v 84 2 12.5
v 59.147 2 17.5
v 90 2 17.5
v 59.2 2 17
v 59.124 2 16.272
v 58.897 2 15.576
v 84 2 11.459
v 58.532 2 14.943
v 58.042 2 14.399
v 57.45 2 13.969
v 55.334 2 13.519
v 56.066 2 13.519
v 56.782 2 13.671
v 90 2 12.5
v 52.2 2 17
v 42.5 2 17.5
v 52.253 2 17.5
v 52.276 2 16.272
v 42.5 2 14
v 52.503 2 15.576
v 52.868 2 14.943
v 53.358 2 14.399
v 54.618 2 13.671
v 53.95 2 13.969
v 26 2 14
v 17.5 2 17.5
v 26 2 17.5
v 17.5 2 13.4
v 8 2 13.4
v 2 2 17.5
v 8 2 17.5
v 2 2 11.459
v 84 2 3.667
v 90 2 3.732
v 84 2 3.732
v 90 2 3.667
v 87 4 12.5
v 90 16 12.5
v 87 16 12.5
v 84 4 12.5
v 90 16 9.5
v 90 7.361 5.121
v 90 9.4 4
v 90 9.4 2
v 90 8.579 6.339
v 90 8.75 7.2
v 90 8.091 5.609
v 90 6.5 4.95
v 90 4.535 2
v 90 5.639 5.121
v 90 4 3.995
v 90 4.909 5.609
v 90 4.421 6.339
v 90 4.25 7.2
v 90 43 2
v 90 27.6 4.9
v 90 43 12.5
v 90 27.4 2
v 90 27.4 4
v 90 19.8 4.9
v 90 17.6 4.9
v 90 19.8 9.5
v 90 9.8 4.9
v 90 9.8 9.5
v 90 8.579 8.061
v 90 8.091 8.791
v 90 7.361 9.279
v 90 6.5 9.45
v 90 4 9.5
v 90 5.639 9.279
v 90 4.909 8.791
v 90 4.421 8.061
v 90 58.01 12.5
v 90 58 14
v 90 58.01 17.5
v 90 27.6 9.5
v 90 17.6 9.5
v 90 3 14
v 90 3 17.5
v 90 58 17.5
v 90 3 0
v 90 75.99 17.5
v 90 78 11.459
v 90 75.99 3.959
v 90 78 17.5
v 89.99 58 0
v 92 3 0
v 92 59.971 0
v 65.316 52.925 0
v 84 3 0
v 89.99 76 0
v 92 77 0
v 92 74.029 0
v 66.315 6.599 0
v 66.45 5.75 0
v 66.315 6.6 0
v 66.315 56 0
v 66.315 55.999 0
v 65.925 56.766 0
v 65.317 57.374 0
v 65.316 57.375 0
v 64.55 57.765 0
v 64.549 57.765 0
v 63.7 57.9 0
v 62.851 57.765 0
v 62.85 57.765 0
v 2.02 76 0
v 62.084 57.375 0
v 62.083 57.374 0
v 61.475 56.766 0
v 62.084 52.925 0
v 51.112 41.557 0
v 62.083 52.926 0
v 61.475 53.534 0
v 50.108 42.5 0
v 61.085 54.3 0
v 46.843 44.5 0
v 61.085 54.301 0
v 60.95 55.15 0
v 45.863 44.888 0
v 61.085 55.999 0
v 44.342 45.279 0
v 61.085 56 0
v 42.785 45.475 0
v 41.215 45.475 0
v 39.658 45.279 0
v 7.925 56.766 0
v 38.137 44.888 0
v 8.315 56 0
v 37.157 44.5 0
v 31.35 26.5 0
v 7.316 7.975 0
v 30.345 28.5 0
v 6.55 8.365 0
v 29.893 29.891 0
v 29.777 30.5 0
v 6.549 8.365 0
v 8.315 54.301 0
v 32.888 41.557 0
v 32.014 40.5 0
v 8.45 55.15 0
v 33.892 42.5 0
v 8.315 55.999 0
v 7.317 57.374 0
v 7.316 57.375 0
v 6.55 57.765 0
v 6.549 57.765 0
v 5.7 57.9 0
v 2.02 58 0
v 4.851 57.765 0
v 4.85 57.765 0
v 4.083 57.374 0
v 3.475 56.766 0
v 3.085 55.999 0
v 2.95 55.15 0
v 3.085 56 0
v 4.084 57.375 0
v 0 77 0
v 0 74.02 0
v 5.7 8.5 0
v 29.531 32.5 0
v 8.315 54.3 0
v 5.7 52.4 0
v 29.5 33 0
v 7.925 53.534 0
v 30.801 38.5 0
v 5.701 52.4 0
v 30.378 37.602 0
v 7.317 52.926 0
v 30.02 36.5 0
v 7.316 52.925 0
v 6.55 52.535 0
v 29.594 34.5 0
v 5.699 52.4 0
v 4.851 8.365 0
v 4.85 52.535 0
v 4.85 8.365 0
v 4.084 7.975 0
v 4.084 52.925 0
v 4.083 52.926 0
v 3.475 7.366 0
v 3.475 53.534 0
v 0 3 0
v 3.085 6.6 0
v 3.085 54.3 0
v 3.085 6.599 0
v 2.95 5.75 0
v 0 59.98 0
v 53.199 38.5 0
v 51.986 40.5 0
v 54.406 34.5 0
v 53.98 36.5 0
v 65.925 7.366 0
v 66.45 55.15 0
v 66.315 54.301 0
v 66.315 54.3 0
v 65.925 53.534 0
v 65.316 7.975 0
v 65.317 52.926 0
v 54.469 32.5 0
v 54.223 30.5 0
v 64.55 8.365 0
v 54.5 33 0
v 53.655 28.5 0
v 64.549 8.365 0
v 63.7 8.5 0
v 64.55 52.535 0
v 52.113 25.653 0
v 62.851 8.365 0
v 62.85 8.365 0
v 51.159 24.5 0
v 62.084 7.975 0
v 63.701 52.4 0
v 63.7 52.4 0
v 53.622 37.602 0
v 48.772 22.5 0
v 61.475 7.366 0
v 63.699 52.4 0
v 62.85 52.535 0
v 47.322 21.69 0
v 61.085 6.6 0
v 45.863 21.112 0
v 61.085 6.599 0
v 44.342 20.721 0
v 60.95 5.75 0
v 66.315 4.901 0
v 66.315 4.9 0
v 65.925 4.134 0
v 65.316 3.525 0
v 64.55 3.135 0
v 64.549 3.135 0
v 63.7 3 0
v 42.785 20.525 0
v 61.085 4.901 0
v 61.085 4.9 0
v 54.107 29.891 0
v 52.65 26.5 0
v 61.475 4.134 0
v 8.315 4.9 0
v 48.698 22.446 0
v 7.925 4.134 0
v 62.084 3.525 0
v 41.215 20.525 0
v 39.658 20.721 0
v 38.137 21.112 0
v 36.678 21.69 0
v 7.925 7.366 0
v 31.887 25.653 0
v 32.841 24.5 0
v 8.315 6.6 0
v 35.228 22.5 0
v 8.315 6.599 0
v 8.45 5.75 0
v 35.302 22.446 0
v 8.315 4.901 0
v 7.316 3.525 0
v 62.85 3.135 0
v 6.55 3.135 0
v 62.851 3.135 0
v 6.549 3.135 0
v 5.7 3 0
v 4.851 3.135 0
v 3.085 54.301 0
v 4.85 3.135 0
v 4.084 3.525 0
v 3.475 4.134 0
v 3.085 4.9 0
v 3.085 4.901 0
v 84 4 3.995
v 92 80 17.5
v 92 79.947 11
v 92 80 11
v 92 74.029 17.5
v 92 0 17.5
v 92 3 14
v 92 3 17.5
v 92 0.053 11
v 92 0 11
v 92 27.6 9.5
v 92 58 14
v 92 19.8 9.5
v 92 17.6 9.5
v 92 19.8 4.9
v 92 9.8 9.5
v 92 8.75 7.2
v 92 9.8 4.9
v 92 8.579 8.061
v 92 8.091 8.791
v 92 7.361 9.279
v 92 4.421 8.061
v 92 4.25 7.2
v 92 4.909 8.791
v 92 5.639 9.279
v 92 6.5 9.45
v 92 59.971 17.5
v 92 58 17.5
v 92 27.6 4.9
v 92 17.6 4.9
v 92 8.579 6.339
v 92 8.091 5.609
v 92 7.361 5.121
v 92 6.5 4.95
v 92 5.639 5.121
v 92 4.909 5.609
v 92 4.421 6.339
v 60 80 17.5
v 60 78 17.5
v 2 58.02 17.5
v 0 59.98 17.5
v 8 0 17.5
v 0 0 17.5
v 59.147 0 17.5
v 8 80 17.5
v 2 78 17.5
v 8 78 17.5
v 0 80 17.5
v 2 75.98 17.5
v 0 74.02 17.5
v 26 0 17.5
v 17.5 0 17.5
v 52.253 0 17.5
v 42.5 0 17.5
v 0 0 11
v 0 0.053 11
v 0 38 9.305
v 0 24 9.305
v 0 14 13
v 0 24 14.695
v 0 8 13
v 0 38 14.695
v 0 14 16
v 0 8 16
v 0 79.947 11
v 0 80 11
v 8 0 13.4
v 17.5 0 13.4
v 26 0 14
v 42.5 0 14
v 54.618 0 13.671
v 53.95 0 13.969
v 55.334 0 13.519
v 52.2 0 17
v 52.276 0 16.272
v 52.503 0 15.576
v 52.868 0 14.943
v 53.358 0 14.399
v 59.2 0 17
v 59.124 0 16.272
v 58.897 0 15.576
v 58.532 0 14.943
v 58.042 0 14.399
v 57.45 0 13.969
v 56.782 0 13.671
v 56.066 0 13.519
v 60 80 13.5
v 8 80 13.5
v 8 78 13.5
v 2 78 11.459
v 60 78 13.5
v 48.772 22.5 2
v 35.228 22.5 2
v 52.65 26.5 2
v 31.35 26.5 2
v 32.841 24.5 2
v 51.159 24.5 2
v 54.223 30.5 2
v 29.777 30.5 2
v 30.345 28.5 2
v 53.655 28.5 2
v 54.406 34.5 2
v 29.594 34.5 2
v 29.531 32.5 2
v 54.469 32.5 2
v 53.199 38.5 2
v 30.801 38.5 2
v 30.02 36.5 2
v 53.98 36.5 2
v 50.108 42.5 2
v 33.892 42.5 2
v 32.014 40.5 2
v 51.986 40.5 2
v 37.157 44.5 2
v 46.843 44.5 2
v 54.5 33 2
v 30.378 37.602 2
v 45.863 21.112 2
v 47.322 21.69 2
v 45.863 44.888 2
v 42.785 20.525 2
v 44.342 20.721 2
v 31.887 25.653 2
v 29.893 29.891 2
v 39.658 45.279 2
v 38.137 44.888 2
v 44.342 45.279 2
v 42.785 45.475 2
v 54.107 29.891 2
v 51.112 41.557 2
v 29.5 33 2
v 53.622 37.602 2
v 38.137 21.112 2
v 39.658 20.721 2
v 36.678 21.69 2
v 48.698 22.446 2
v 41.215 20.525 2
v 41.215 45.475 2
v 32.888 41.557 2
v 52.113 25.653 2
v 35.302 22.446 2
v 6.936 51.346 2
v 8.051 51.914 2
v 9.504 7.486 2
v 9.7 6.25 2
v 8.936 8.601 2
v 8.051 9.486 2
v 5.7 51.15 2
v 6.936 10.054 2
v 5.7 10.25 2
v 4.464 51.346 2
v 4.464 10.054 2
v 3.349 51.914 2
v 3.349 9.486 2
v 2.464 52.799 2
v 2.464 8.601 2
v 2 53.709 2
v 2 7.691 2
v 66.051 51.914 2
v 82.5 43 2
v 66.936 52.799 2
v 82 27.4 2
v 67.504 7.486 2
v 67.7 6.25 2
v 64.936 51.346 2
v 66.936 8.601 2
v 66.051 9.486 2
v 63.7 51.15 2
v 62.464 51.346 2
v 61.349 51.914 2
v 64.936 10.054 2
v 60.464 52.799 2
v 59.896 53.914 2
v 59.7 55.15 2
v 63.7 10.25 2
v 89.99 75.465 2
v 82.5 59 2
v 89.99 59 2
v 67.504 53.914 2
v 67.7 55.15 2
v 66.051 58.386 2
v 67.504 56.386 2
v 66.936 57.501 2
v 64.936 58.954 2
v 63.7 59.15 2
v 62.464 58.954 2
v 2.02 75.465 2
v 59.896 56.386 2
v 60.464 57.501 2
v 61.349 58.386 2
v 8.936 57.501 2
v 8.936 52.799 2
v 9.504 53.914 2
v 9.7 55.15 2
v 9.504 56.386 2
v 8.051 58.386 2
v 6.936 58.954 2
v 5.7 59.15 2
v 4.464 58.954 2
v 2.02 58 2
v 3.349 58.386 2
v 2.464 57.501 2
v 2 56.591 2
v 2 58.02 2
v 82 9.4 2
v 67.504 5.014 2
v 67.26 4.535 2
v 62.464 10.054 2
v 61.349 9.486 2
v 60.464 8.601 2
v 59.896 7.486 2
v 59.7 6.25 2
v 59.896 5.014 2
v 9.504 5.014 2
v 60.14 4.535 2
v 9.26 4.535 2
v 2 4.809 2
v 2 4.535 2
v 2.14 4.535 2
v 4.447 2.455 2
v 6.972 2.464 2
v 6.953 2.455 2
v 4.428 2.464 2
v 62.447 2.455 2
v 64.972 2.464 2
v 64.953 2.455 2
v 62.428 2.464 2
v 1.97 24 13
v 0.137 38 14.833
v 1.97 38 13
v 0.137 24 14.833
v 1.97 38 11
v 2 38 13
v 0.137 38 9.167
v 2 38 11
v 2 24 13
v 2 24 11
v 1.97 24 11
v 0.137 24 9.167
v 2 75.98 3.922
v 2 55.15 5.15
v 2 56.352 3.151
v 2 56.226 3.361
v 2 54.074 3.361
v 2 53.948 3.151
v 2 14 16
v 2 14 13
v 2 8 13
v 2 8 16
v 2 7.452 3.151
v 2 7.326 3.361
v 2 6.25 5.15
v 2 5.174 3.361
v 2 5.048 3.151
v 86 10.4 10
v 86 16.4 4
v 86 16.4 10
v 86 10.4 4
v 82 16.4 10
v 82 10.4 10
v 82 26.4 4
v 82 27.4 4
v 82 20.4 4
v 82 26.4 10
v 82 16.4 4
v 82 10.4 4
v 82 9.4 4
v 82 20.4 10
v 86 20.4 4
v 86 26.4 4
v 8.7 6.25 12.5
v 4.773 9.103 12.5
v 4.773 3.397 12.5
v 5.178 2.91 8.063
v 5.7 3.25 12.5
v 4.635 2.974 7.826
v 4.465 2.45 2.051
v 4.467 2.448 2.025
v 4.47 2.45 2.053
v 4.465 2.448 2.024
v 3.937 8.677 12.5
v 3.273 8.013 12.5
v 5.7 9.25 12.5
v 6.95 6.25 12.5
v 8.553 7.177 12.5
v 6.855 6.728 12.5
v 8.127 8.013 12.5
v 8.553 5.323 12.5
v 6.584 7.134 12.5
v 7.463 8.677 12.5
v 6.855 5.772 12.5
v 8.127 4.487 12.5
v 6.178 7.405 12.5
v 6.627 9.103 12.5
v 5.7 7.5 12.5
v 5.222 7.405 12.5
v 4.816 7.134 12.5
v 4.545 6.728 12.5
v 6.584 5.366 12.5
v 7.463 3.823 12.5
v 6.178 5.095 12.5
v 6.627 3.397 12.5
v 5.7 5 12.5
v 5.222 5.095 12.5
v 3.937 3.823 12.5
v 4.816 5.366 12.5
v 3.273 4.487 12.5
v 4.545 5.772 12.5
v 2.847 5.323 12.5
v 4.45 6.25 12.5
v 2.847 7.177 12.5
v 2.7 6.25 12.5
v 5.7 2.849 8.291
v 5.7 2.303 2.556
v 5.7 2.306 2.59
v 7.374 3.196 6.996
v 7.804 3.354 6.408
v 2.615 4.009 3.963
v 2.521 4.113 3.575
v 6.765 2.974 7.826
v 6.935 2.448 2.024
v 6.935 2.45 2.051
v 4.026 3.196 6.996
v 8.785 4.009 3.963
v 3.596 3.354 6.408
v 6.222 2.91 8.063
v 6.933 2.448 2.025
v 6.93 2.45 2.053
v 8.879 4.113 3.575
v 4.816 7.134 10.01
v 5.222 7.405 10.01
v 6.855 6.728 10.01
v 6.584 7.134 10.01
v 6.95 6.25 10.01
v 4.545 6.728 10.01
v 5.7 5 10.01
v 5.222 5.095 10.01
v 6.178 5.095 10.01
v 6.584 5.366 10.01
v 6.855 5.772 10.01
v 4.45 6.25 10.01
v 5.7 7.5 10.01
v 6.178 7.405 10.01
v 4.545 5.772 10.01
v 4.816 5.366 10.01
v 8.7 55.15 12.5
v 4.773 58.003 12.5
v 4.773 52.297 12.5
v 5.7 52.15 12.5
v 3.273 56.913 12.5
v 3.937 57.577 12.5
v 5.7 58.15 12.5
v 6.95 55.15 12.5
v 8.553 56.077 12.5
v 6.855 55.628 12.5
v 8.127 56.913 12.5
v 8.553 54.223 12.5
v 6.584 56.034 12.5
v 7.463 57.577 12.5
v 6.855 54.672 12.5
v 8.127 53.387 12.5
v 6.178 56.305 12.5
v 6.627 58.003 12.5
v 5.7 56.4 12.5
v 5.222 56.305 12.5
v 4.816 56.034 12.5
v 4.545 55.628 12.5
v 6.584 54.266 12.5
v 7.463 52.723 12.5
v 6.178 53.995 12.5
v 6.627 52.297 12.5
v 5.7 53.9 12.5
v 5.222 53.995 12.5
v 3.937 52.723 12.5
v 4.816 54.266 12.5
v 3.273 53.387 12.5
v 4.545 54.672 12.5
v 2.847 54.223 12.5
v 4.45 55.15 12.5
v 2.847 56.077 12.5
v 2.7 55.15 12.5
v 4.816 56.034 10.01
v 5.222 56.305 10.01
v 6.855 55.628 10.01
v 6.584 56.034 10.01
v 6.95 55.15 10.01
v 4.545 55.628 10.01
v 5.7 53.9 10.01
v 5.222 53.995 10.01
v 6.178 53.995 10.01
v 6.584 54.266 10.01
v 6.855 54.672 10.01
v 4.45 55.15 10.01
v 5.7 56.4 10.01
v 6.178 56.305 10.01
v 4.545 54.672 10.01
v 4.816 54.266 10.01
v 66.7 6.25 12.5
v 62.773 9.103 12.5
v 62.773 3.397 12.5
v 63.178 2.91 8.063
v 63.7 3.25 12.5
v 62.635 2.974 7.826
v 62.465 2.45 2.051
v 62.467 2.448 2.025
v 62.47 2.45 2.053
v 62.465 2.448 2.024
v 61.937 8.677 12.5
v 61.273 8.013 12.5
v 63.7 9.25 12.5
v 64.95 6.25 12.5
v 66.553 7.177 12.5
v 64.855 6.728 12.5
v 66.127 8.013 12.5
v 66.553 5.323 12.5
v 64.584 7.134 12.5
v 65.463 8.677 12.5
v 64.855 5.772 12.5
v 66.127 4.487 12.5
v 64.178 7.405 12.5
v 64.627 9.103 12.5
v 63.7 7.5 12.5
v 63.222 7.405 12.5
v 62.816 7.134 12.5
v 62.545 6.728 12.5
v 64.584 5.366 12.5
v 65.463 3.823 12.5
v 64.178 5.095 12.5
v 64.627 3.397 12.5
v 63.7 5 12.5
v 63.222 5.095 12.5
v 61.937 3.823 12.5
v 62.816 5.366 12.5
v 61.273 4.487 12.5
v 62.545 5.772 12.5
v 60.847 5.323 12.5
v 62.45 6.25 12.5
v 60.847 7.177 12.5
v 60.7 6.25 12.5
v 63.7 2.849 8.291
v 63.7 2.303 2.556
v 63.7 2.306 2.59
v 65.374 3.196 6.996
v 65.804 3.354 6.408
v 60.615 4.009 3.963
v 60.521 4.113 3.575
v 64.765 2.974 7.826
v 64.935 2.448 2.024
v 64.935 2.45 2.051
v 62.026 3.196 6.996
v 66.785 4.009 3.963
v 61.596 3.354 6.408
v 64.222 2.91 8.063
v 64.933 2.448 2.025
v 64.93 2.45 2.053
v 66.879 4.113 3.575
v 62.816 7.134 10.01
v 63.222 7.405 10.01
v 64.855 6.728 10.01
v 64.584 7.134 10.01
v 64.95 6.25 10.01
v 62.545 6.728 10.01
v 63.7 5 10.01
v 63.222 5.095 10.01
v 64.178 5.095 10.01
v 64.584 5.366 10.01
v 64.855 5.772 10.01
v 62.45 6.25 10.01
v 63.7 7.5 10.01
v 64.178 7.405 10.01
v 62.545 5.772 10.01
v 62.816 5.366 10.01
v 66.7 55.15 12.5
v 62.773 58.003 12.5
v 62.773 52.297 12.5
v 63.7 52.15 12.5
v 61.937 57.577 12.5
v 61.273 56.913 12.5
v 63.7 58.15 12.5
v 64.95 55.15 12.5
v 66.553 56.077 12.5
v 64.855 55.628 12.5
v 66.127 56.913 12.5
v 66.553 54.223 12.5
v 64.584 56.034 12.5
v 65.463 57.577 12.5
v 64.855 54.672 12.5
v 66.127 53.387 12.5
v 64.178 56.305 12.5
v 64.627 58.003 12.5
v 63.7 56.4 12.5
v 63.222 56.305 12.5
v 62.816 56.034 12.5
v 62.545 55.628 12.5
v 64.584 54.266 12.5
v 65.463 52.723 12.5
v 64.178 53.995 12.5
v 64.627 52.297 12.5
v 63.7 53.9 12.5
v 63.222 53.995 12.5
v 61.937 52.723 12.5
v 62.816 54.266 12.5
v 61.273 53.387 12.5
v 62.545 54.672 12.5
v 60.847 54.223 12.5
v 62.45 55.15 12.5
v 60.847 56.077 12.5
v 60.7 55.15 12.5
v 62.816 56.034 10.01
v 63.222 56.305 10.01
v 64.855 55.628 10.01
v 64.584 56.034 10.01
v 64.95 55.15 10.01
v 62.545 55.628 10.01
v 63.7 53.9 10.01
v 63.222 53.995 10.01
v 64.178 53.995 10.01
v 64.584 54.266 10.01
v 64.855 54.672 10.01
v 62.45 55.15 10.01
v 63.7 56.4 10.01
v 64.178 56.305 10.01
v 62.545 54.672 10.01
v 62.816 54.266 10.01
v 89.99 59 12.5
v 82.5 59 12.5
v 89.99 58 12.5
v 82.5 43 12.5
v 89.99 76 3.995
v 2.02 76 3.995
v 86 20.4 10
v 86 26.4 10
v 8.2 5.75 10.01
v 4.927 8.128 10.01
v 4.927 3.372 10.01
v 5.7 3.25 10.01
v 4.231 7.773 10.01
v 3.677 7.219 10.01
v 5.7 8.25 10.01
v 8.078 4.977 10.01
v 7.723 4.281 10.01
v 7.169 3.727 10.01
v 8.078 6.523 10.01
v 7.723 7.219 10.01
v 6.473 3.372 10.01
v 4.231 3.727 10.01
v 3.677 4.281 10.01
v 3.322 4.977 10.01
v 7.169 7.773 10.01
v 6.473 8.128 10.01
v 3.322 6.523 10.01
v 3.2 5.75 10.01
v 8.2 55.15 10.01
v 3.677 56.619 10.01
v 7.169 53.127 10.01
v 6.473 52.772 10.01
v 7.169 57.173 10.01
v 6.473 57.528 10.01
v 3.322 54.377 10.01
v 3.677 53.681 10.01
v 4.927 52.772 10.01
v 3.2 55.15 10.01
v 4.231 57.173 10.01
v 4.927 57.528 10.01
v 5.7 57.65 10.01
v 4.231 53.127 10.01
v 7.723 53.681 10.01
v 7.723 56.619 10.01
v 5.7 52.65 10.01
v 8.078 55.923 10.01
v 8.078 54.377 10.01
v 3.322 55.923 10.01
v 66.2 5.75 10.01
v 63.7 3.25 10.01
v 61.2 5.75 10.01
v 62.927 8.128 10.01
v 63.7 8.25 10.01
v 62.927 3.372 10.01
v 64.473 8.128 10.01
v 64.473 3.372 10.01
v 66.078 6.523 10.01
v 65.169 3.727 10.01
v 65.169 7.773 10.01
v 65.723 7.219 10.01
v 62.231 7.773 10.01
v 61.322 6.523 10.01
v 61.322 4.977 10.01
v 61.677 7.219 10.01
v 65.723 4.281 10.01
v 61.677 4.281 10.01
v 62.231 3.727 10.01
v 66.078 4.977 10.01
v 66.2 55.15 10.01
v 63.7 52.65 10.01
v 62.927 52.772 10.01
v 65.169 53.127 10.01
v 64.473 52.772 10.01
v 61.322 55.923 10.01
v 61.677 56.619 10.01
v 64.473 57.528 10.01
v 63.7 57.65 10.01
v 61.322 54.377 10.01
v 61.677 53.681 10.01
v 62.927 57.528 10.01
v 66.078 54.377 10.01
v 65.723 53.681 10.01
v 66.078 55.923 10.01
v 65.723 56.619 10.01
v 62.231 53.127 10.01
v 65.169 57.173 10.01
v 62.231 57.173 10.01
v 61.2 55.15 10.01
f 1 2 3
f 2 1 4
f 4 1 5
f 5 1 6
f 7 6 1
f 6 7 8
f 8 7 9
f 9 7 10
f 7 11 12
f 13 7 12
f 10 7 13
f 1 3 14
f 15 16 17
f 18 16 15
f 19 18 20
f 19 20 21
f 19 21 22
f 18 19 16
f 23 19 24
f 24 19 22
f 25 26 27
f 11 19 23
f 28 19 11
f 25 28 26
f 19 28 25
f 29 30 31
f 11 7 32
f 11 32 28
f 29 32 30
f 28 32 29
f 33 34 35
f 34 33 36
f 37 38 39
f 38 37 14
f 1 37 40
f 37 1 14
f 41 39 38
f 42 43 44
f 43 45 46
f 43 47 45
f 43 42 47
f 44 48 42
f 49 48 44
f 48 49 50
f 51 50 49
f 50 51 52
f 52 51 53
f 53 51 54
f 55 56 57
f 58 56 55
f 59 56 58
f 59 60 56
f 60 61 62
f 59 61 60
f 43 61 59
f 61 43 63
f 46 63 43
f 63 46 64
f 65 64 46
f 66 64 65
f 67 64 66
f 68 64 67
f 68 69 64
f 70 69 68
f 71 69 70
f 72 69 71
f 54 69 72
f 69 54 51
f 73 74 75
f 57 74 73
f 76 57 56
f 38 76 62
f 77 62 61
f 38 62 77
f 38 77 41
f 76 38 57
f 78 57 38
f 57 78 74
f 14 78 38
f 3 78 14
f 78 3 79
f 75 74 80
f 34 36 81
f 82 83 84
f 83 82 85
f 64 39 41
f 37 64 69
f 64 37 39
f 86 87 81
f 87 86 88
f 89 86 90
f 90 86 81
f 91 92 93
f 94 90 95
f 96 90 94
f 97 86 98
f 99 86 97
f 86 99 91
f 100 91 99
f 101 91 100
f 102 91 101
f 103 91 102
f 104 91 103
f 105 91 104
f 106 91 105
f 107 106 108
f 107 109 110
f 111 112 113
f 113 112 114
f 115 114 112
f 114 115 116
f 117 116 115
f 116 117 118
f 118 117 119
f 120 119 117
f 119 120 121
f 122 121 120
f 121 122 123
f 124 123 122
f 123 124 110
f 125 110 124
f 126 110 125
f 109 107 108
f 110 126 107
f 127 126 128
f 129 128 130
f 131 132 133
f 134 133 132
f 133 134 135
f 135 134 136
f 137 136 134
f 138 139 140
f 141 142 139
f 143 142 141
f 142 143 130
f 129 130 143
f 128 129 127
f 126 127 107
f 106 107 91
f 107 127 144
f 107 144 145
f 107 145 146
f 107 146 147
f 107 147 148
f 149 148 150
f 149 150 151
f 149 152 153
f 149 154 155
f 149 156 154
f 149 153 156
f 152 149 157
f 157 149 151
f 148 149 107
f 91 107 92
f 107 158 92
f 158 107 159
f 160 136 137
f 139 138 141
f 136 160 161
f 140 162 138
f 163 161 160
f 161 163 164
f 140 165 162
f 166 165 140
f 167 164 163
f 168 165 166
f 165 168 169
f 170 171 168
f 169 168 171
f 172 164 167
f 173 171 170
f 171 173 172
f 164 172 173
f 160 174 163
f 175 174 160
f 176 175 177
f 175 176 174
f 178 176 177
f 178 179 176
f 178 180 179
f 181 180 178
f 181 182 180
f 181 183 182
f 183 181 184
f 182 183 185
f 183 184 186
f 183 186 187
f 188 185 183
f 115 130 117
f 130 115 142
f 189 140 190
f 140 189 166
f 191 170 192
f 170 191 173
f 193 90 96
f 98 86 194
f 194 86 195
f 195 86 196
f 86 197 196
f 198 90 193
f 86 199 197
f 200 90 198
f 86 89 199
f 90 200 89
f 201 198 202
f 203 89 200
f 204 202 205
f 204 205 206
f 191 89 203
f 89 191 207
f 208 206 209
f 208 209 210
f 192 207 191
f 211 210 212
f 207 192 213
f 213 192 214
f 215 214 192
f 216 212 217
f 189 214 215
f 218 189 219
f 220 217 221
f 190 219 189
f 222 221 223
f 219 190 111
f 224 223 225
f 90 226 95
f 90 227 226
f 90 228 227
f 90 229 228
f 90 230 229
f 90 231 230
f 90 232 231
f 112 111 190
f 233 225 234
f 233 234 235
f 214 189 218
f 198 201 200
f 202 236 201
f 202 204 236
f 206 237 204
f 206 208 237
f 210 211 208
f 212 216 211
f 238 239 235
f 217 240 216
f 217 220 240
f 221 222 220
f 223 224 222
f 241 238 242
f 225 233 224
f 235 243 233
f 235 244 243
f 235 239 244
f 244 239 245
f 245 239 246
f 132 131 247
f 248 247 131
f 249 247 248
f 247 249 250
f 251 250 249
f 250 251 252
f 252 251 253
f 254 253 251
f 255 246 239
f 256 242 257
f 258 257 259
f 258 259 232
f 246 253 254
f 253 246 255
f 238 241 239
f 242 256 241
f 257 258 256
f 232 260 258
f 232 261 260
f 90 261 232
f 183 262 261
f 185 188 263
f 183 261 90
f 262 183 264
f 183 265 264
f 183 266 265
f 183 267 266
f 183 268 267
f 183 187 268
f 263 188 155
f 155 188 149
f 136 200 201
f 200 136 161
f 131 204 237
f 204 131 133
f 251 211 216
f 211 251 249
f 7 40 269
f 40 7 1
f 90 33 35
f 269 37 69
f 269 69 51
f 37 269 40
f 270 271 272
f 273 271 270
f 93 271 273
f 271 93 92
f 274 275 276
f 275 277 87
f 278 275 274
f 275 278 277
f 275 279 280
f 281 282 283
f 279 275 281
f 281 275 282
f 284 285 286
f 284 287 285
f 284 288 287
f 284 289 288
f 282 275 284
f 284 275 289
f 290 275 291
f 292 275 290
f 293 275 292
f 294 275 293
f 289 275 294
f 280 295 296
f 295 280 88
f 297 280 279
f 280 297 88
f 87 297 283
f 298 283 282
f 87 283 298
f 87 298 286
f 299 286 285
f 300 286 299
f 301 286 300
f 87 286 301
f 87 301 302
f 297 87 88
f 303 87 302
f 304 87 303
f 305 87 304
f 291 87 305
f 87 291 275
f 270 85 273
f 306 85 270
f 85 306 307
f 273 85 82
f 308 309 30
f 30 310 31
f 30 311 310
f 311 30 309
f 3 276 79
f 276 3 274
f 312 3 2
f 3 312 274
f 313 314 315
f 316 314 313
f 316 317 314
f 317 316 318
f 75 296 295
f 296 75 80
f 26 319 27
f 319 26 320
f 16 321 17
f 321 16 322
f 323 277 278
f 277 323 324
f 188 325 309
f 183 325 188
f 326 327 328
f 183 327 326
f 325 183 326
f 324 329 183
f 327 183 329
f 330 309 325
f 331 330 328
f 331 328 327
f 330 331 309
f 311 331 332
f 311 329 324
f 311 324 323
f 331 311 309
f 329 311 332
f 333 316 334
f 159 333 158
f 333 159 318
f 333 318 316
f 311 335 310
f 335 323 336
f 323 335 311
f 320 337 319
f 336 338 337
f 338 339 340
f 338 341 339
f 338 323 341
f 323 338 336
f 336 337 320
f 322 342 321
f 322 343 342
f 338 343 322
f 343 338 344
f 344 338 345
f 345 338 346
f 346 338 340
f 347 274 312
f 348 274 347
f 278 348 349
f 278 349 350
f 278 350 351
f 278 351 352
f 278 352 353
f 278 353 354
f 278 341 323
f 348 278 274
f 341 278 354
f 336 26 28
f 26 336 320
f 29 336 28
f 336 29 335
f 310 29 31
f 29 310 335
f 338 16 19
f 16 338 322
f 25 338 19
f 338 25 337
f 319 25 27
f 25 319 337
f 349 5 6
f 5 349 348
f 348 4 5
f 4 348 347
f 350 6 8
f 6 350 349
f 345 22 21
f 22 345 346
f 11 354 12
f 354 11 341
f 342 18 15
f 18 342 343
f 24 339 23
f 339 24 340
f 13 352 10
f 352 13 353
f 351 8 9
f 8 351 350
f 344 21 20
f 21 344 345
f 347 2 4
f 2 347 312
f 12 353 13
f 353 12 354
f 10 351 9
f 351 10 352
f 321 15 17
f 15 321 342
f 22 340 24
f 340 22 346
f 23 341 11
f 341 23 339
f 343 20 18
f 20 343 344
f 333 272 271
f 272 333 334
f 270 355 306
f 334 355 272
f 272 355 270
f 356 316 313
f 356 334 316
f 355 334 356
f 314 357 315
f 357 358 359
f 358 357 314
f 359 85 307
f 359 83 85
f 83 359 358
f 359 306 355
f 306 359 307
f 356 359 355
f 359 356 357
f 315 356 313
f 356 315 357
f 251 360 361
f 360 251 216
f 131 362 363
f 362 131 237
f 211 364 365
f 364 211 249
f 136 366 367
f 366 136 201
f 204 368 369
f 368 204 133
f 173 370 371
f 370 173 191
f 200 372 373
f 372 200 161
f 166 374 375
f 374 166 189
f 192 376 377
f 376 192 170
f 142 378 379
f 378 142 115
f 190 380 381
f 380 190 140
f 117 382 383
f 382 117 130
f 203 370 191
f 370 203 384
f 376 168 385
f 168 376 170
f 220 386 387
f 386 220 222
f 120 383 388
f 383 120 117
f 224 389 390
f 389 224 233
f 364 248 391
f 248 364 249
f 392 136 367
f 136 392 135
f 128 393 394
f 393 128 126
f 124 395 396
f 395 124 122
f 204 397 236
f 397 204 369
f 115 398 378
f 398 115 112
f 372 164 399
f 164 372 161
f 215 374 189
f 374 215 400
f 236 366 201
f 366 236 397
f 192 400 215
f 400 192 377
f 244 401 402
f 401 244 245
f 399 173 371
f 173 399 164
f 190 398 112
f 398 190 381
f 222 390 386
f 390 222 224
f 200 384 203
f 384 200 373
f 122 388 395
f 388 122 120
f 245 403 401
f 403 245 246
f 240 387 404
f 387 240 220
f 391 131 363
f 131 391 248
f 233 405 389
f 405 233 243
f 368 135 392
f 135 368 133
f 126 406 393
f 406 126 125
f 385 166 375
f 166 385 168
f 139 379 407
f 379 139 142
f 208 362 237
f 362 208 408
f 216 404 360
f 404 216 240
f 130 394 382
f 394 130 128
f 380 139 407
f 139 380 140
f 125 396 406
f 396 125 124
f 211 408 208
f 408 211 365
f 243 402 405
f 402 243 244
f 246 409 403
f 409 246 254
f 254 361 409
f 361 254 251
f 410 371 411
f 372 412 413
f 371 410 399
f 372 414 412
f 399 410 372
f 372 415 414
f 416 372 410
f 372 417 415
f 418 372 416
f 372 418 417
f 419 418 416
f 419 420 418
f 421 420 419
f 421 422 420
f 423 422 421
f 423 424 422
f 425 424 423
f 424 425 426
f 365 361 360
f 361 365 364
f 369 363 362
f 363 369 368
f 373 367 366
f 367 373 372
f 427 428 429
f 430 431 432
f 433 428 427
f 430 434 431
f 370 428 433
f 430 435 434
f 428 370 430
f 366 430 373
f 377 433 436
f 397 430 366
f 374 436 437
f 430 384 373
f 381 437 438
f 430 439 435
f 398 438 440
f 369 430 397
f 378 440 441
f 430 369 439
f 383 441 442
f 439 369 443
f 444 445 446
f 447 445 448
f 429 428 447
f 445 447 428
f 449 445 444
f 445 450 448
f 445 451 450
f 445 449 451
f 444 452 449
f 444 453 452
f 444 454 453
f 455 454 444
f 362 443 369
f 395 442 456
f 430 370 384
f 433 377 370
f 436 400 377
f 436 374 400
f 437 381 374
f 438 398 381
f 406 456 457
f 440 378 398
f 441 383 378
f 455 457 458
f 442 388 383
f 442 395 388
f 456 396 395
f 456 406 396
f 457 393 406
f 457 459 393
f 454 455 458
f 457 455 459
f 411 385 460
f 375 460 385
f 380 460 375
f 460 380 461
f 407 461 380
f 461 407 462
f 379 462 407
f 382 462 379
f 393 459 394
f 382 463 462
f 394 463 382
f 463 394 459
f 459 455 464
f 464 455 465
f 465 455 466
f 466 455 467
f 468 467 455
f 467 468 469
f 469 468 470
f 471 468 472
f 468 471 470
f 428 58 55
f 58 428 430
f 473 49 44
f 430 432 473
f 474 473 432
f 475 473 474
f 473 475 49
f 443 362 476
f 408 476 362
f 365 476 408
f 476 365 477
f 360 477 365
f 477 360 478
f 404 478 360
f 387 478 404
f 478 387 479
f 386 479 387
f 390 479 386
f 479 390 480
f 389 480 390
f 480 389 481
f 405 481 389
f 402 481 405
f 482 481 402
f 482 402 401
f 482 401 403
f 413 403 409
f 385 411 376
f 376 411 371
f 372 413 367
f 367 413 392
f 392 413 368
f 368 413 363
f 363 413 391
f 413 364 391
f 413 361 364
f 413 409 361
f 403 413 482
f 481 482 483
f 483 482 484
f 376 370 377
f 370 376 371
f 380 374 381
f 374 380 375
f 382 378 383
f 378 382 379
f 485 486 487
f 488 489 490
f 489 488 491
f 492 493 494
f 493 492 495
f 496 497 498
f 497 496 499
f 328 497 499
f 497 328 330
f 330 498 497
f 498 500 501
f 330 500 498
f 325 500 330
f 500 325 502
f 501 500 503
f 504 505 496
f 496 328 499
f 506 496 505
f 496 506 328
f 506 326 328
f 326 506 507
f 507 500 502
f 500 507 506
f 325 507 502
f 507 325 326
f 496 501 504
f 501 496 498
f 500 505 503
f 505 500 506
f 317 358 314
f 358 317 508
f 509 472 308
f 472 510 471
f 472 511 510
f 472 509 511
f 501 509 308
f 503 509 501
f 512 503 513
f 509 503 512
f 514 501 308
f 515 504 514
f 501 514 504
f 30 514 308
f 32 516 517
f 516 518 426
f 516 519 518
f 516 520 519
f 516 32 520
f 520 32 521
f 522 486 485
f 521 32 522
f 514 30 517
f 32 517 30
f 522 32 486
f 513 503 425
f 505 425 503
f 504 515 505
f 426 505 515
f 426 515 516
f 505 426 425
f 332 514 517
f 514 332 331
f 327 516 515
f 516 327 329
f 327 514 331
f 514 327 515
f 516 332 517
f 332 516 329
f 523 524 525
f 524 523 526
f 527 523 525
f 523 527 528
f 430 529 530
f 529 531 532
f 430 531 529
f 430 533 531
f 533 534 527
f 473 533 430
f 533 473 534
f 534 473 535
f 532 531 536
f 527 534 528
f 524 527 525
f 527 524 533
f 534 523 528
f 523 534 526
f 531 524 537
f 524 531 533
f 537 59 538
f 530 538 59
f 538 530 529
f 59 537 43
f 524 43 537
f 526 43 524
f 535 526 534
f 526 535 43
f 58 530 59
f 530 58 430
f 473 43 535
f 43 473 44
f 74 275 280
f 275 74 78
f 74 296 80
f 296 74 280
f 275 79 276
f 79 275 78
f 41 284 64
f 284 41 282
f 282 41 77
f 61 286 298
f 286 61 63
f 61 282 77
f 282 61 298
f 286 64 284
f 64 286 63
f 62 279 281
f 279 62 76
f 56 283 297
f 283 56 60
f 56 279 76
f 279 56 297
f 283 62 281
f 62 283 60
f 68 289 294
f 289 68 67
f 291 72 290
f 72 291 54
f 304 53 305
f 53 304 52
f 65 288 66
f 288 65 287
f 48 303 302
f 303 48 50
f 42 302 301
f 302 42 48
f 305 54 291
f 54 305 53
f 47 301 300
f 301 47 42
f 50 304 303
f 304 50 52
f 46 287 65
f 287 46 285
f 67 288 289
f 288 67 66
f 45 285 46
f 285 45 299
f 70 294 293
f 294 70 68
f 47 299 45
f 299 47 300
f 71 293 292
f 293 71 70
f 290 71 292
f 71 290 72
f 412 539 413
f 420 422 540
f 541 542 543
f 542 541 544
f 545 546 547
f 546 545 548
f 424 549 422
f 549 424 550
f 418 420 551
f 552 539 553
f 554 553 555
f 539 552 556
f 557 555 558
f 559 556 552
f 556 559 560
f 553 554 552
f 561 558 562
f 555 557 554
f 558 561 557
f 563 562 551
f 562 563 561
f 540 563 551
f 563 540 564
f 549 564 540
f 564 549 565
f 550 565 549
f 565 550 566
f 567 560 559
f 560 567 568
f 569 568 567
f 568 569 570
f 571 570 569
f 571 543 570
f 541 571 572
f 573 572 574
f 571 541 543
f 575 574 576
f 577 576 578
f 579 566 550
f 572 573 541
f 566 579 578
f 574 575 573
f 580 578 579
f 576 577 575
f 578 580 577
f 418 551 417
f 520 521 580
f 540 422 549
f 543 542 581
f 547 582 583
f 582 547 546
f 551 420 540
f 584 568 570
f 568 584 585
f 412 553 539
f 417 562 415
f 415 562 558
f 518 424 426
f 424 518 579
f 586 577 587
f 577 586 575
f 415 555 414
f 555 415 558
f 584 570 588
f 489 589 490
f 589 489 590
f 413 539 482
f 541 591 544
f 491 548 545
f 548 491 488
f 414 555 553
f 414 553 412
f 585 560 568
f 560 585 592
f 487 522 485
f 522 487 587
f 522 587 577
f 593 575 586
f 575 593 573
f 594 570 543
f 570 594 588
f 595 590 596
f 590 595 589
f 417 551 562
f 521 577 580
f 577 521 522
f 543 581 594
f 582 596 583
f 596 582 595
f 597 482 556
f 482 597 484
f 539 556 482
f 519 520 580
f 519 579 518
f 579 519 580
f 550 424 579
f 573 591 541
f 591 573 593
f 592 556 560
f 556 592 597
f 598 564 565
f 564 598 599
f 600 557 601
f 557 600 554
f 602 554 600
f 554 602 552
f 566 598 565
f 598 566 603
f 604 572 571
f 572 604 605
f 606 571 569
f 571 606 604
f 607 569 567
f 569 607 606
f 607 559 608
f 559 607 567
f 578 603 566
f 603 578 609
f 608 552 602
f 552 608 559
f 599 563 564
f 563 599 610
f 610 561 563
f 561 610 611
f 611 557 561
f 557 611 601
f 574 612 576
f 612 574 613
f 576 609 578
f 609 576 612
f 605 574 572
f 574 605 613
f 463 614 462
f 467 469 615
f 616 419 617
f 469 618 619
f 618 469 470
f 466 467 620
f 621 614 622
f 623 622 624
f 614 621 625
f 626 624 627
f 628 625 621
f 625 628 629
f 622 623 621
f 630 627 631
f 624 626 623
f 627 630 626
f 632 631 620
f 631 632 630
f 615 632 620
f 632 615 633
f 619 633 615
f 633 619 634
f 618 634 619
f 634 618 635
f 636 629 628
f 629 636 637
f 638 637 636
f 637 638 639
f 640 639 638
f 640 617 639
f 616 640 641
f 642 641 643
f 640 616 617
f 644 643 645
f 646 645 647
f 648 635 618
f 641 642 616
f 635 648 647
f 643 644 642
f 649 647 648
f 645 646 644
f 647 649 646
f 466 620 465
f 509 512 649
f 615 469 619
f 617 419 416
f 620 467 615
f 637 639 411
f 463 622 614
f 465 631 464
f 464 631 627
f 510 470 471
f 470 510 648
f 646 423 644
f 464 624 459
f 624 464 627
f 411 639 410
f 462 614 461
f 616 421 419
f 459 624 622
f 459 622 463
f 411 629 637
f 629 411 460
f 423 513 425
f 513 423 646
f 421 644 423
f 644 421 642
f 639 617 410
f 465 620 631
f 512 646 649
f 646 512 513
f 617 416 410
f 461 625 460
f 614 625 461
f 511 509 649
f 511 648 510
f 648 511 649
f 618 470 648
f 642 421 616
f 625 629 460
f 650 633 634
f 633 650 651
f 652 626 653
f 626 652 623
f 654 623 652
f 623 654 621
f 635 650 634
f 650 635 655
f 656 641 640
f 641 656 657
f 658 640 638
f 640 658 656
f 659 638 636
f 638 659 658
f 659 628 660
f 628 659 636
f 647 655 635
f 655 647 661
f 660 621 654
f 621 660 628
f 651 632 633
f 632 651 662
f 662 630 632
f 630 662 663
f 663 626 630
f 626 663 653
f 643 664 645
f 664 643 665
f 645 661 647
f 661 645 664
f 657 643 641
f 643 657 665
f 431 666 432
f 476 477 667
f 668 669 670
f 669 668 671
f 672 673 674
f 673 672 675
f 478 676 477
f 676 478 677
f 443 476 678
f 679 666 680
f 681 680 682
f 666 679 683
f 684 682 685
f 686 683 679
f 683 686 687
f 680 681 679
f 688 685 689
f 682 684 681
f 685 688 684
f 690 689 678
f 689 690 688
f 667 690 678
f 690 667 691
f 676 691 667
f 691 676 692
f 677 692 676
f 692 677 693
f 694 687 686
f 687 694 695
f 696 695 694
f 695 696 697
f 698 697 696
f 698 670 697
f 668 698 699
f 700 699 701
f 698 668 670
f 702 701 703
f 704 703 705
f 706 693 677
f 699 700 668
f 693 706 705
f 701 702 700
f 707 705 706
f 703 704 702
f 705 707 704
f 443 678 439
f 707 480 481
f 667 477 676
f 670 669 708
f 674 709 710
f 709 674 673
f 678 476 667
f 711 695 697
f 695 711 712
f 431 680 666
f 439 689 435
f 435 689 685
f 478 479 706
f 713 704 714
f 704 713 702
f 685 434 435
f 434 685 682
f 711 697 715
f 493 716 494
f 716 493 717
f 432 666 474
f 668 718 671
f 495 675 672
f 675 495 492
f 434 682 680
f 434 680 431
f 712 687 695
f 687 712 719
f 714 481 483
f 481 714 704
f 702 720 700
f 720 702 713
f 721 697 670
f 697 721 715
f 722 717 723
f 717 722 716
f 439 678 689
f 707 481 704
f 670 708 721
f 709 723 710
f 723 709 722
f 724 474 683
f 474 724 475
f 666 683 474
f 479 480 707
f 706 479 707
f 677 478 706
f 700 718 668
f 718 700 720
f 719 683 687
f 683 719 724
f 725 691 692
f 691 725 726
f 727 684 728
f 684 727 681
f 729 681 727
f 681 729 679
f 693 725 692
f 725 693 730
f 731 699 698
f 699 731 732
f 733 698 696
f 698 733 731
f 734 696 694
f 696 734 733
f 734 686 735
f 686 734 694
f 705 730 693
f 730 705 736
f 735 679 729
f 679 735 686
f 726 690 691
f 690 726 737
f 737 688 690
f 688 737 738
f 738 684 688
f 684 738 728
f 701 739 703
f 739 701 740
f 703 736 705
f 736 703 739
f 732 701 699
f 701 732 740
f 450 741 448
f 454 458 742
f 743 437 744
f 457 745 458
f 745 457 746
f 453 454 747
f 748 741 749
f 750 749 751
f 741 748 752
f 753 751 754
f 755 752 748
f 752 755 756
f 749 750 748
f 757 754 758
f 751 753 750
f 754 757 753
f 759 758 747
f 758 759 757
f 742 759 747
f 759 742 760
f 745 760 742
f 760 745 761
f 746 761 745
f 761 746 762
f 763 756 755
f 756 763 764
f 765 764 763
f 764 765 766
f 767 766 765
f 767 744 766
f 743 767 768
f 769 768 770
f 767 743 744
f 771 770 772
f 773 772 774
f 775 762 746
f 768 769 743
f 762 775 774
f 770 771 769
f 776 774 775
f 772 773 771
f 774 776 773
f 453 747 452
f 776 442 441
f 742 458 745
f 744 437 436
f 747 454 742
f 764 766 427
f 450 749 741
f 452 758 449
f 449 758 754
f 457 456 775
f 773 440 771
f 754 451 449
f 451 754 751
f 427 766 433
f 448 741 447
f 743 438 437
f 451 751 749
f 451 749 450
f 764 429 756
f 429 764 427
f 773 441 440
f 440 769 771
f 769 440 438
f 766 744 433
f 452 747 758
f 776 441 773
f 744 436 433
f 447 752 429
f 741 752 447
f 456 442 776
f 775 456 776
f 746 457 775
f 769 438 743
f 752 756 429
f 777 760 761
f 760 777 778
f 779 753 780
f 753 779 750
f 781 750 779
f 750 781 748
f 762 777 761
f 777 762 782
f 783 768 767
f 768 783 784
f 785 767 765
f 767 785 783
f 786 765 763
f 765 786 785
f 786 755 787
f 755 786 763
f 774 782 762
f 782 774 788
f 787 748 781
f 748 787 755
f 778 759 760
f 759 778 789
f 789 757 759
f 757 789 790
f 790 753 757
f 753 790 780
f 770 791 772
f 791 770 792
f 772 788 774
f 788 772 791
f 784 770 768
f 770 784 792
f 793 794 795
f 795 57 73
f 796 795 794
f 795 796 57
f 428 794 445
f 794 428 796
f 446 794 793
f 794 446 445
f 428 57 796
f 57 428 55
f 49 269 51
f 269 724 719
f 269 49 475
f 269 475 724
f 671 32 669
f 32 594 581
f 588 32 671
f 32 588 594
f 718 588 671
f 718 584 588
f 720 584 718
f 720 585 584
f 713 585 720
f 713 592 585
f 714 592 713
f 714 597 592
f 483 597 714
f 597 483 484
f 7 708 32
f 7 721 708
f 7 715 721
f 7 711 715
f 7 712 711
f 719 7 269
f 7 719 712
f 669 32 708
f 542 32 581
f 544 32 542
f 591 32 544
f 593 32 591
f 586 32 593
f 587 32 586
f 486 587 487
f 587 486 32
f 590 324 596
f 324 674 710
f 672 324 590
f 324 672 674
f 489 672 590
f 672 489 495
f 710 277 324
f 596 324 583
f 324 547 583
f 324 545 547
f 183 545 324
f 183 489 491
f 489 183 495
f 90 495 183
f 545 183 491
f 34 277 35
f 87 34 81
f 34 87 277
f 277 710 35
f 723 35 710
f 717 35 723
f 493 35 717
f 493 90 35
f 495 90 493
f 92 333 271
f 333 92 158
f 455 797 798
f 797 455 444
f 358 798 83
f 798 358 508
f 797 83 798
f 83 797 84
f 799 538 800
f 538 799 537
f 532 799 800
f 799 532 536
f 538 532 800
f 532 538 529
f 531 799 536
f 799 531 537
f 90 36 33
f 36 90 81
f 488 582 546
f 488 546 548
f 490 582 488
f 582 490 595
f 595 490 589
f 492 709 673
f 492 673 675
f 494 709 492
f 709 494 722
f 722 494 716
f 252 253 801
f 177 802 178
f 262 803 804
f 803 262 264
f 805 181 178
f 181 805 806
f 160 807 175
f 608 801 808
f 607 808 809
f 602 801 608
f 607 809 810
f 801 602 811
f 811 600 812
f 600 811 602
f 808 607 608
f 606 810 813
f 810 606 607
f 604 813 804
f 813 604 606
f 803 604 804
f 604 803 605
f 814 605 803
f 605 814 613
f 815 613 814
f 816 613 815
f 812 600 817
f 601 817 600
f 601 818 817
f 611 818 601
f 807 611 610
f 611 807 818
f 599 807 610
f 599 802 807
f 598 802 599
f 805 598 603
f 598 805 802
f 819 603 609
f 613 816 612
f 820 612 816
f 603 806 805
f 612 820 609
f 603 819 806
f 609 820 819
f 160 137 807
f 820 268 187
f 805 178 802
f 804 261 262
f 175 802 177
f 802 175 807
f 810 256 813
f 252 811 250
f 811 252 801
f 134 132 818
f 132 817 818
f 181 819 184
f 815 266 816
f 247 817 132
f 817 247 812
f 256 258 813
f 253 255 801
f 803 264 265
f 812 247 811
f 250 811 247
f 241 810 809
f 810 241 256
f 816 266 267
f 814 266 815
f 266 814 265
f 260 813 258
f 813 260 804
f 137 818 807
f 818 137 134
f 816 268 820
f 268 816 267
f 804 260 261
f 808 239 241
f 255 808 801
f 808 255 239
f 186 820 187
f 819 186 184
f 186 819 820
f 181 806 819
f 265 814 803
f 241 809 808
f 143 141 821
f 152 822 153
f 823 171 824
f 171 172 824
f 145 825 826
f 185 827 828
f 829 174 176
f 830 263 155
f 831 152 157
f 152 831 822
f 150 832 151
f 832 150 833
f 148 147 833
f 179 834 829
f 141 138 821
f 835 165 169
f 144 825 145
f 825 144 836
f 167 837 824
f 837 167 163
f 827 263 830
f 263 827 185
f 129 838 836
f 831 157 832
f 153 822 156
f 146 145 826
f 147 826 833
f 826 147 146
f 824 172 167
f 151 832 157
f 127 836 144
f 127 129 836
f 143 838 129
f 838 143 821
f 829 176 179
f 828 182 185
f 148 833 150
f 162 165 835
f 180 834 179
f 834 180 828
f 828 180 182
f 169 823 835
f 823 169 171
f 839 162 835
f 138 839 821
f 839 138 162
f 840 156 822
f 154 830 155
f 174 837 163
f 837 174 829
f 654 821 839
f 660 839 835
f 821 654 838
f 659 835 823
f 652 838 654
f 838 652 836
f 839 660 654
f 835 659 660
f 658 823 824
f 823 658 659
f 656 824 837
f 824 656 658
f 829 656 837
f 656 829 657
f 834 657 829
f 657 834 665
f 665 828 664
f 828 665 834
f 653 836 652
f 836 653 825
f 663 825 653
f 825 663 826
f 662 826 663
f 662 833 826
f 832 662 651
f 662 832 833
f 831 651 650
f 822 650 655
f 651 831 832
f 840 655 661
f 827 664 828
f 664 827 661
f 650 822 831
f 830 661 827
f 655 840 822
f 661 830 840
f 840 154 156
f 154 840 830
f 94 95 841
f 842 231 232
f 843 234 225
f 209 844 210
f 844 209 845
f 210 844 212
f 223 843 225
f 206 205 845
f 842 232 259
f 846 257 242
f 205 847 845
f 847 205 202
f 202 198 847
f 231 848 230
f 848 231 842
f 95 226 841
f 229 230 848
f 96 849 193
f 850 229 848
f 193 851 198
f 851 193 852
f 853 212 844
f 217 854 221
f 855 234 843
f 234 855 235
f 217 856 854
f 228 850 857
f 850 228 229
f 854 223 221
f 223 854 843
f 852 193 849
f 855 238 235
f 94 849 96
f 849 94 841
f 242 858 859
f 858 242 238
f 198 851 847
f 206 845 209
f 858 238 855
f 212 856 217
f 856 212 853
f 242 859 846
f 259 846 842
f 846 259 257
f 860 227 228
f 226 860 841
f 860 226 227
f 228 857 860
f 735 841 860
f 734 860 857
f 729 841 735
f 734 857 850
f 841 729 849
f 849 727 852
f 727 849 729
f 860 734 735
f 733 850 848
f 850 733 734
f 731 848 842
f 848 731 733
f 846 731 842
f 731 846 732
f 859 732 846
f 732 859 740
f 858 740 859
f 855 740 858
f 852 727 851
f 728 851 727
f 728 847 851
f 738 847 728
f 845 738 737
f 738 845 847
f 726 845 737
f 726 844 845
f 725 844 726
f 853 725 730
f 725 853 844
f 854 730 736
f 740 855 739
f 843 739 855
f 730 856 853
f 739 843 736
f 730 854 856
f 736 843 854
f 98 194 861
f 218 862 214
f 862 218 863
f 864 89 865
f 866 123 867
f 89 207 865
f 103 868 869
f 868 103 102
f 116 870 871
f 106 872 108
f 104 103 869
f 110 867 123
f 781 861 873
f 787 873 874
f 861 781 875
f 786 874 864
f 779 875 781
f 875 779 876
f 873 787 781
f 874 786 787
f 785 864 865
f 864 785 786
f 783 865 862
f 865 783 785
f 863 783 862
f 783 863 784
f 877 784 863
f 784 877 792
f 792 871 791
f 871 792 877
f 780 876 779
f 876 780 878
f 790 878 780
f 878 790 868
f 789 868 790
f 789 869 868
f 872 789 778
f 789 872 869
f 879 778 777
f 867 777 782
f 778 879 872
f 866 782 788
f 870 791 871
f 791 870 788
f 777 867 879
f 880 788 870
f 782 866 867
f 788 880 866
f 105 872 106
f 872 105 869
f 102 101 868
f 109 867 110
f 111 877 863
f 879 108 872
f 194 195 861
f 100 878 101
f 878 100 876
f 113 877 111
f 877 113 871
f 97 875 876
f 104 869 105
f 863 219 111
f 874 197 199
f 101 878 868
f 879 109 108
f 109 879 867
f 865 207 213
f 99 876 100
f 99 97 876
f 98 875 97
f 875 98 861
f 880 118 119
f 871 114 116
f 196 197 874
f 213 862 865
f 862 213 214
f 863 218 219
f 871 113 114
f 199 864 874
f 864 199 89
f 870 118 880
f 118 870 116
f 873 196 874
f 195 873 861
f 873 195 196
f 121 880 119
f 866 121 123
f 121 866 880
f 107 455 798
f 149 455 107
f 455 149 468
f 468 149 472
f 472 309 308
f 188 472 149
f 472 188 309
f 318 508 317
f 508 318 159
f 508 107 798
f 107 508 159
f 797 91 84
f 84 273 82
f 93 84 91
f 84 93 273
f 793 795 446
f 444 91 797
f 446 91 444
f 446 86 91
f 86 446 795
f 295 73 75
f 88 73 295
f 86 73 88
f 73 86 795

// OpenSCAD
part="bottom";
colors="gray";
bh=17.5;
bd=91;
bottom_fan=25;
gpio_slot=1;
extra_usb_slot=0;

if(part=="bottom") {
if(colors=="black"||colors=="both")
color(colors=="both"?"black":"gold") {
  if(colors=="black")
  {
    translate([bd+10,10.1,0]) rotate([0,-90]) difference() {
      union() {
        translate([0,0,0]) cube([4.3,7.8,5]);
        translate([0,-1,4]) rotate([90,0,90]) linear_extrude(4.3) polygon([[0,0],[1,1],[8.8,1],[9.8,0]]);
      }
      translate([2.15,3.9,2.7]) cylinder(d=4,h=2.01,$fn=20);
      translate([-.01,.8,3]) cube([6.2,6.2,3]);
      *translate([-.01,2.15,3.01]) cube([5,3.5,1]);
      *translate([-.01,1.9,1.1]) cube([5,4.1,2.02]);
    }
    translate([bd+10,20.1,0]) rotate([0,-90]) difference() {
      translate([0,0,0]) union() {
          translate([0,0,0]) cube([4.3,7.8,5]);
          translate([0,-1,4]) rotate([90,0,90]) linear_extrude(4.3) polygon([[0,0],[1,1],[8.8,1],[9.8,0]]);
        }
      translate([2.15,3.9,2.7]) cylinder(d=4,h=2.01,$fn=20);
      translate([-.01,.8,3]) cube([6.2,6.2,3]);
      *translate([-.01,2.15,3.01]) cube([5,3.5,1]);
      *translate([-.01,1.9,1.1]) cube([5,4.1,2.02]);
    }
  }
  *translate([bd-4,10,5]) cube([6,8,4.5]);
  *translate([bd-4,20,5]) cube([6,8,4.5]);
  scale(0.9) translate([bd-1.02,59]) rotate([0,colors=="both"?0:-90]) difference() {
    translate([0,1]) linear_extrude(bh+.03) polygon([[2,0],[0,-2],[0,16],[2,14]]);
    *cube([2.03,17,bh+.01]);
    if(extra_usb_slot)
      translate([-.01,1,bh-13.2]) cube([3,15,13.3]);
  }
  scale(0.9) translate([-.01,60]) rotate([0,colors=="both"?0:90]) linear_extrude(bh+.03) polygon([[0,0],[2,-2],[2,16],[0,14]]);
  *translate([-.01,60]) cube([2.02,14,bh+.01]);
}
if(colors=="gray"||colors=="both")
color("gray")
difference(){
intersection(){
  translate([0,4]) rotate([0,90,0]) rotate([0,0,90]) linear_extrude(bd+1) polygon([[-1,0],[-4,11],[-4,bh],[76,bh],[76,11],[73,0]]);
  union(){
    translate([bd-7,2,9.5]) {
      translate([3,0,3]) rotate([-90,0]) linear_extrude(14) polygon([[0,0],[3,0],[3,3]]);
      translate([0,0,-9.5]) cube([6,2,12.5]);
      *cube([6,14,3]);
    }
    translate([82.5,43]) cube([8,16,12.5]);
translate([0,0,11]) difference() { // left
  cube([bd+1,2,bh-11]);
  translate([8,-0.01,2.4]) cube([9.5,2.02,6]);
  translate([26,-.01,3]) cube([16.5,2.02,4]);
  translate([55.7,-.01,6]) rotate([-90,0]) cylinder(d=7,h=4,$fn=30);
}
translate([0,3,0]) rotate([15,0]) cube([92,2,11.4]);
translate([0,78,11]) difference() {
  cube([bd+1,2,bh-11]); // right
  if(gpio_slot)
    translate([8,-.01,bh-15]) cube([52,2.02,10]);
}
translate([0,77,0]) mirror([0,1,0]) rotate([15,0]) cube([92,2,11.4]);
difference(){
  translate([0,3,0]) cube([bd+1,74,2]);
  if(bottom_fan>0)
  translate([42-bottom_fan/2,33-bottom_fan/2,-.01]) {
    
    intersection(){
      translate([bottom_fan/2,bottom_fan/2]) cylinder(d=bottom_fan,h=3,$fn=50);
    for(i=[0:bottom_fan/4]) translate([0,4*i]) cube([bottom_fan,2,2.02]);
    }
  }
}
difference(){ // back
  translate([0,4]) rotate([0,90,0]) rotate([0,0,90]) linear_extrude(2) polygon([[0,0],[-3,11],[-3,bh],[75,bh],[75,11],[72,0]]);
  translate([-.01,24,11]) {
    cube([4.02,14,2]);
    translate([2,0]) mirror([1,0]) {
    rotate([0,-45]) cube([4.02,14,1.4]);
    mirror([0,0,1]) translate([0,0,-2]) rotate([0,-45]) translate([0,0]) cube([4.02,14,1.4]);
    }
  }
  translate([-.01,8,13]) cube([2.02,6,3]);
}
translate([bd-9,10.4,2]) {
  cube([4,6,8]);
  translate([0,-1,0]) cube([9,18,2]);
}
translate([bd-9,20.4,2]) cube([4,6,8]);
difference(){ // front
  translate([bd-1,4]) rotate([0,90,0]) rotate([0,0,90]) linear_extrude(2) polygon([[0,0],[-3,11],[-3,bh],[75,bh],[75,11],[72,0]]);
  translate([bd-1.01,3,14]) cube([3,55,5]);
  translate([bd-3,9.8,4.9]) cube([6,7.8,4.6]);
  translate([bd-3,19.8,4.9]) cube([6,7.8,4.6]);
  translate([bd-3,6.5,7.2]) rotate([0,90,0]) cylinder(d=4.5,h=6,$fn=16);
}
translate([5.7,5.75]) {
  translate([0,0.5,2]) difference(){
    cylinder(d1=8,d2=6,h=10.5,$fn=20);
    cylinder(d=2.5,h=15,$fn=16);
  }
  translate([0,49.4,2]) difference(){
    cylinder(d1=8,d2=6,h=10.5,$fn=20);
    cylinder(d=2.5,h=15,$fn=16);
  }
  translate([58,0.5,2]) difference(){
    cylinder(d1=8,d2=6,h=10.5,$fn=20);
    cylinder(d=2.5,h=15,$fn=16);
  }
  translate([58,49.4,2]) difference(){
    cylinder(d1=8,d2=6,h=10.5,$fn=20);
    cylinder(d=2.5,h=15,$fn=16);
  }
}
}
}
translate([-.02,60,-.01]) {
  linear_extrude(bh+.03) polygon([[0,0],[2.04,-2],[2.04,16],[0,14]]);
  *cube([2.04,14,bh+.03]);
}
translate([bd-1.01,59,-.01]) {
  translate([0,1]) linear_extrude(bh+.03) polygon([[0,-2],[2.04,0],[2.04,14],[0,16]]);
  *cube([2.04,17,bh+.03]);
}
translate([5.7,5.75]) {
  translate([0,0,-.01]) cylinder(d1=5.5,d2=5,h=10.02,$fn=20);
  translate([0,49.4,-.01]) cylinder(d1=5.5,d2=5,h=10.02,$fn=20);
  translate([58,0,-.01]) cylinder(d1=5.5,d2=5,h=10.02,$fn=20);
  translate([58,49.4,-.01]) cylinder(d1=5.5,d2=5,h=10.02,$fn=20);
}
}
}
